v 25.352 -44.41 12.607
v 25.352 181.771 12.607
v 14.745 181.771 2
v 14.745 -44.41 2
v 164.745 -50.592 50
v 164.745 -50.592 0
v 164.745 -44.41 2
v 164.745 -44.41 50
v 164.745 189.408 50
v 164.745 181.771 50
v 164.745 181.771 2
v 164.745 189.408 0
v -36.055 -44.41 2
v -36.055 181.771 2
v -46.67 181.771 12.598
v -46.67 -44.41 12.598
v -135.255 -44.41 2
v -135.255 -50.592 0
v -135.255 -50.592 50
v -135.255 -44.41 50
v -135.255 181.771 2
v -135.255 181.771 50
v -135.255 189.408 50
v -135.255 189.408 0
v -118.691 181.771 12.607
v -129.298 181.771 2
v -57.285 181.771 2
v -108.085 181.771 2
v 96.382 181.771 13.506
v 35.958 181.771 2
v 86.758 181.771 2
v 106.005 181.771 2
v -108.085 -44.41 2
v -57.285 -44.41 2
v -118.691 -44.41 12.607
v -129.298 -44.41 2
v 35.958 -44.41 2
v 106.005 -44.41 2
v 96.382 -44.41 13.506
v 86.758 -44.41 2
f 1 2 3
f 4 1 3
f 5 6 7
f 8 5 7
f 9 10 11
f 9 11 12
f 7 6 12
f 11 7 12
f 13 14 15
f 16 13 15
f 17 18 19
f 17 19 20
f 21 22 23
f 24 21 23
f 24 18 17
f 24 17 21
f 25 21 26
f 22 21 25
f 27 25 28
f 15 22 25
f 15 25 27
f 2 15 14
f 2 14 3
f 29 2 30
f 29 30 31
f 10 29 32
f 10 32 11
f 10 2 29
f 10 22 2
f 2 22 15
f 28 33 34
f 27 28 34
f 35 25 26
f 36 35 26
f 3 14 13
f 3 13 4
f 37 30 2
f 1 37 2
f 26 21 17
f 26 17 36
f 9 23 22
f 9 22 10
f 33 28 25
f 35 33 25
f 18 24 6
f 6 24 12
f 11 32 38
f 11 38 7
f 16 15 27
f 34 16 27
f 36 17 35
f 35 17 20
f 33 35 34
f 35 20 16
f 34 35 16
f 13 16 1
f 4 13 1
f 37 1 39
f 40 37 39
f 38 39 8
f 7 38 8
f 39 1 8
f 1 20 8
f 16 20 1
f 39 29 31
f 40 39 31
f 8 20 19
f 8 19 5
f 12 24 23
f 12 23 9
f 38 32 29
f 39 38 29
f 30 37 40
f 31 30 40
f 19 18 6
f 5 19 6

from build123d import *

# Parameters (mm, degrees)
F0_W     = 300
F0_H     = 240
F1_DEPTH = 50
F2_W     = 300
F2_H     = 226.181105
F3_DEPTH = 48
F5_DEPTH = 228.9


with BuildPart() as f1:
    # F0 (on Top) → F1 (new body)
    with BuildSketch(Plane.XY):
        with Locations((14.745144, 69.408495)):
            Rectangle(F0_W, F0_H)
    extrude(amount=F1_DEPTH)

    # F2 (on face) → F3 (cut)
    with BuildSketch(Plane.XY.offset(50)):
        with Locations((14.745144, 68.680338)):
            Rectangle(F2_W, F2_H)
    extrude(amount=-F3_DEPTH, mode=Mode.SUBTRACT)

    # F4 (on face) → F5 (join)
    with BuildSketch(Plane.XZ.offset(-181.770891)):
        Polygon((-118.691458, 12.606602), (-129.298059, 2), (-108.084856, 2), align=None)
        Polygon((14.745144, 2), (35.958348, 2), (25.351746, 12.606602), align=None)
        Polygon((86.758348, 2), (106.004746, 2), (96.381547, 13.506261), align=None)
        Polygon((-57.284856, 2), (-36.054856, 2), (-46.669856, 12.598197), align=None)
    extrude(amount=F5_DEPTH)


solid = f1.part
